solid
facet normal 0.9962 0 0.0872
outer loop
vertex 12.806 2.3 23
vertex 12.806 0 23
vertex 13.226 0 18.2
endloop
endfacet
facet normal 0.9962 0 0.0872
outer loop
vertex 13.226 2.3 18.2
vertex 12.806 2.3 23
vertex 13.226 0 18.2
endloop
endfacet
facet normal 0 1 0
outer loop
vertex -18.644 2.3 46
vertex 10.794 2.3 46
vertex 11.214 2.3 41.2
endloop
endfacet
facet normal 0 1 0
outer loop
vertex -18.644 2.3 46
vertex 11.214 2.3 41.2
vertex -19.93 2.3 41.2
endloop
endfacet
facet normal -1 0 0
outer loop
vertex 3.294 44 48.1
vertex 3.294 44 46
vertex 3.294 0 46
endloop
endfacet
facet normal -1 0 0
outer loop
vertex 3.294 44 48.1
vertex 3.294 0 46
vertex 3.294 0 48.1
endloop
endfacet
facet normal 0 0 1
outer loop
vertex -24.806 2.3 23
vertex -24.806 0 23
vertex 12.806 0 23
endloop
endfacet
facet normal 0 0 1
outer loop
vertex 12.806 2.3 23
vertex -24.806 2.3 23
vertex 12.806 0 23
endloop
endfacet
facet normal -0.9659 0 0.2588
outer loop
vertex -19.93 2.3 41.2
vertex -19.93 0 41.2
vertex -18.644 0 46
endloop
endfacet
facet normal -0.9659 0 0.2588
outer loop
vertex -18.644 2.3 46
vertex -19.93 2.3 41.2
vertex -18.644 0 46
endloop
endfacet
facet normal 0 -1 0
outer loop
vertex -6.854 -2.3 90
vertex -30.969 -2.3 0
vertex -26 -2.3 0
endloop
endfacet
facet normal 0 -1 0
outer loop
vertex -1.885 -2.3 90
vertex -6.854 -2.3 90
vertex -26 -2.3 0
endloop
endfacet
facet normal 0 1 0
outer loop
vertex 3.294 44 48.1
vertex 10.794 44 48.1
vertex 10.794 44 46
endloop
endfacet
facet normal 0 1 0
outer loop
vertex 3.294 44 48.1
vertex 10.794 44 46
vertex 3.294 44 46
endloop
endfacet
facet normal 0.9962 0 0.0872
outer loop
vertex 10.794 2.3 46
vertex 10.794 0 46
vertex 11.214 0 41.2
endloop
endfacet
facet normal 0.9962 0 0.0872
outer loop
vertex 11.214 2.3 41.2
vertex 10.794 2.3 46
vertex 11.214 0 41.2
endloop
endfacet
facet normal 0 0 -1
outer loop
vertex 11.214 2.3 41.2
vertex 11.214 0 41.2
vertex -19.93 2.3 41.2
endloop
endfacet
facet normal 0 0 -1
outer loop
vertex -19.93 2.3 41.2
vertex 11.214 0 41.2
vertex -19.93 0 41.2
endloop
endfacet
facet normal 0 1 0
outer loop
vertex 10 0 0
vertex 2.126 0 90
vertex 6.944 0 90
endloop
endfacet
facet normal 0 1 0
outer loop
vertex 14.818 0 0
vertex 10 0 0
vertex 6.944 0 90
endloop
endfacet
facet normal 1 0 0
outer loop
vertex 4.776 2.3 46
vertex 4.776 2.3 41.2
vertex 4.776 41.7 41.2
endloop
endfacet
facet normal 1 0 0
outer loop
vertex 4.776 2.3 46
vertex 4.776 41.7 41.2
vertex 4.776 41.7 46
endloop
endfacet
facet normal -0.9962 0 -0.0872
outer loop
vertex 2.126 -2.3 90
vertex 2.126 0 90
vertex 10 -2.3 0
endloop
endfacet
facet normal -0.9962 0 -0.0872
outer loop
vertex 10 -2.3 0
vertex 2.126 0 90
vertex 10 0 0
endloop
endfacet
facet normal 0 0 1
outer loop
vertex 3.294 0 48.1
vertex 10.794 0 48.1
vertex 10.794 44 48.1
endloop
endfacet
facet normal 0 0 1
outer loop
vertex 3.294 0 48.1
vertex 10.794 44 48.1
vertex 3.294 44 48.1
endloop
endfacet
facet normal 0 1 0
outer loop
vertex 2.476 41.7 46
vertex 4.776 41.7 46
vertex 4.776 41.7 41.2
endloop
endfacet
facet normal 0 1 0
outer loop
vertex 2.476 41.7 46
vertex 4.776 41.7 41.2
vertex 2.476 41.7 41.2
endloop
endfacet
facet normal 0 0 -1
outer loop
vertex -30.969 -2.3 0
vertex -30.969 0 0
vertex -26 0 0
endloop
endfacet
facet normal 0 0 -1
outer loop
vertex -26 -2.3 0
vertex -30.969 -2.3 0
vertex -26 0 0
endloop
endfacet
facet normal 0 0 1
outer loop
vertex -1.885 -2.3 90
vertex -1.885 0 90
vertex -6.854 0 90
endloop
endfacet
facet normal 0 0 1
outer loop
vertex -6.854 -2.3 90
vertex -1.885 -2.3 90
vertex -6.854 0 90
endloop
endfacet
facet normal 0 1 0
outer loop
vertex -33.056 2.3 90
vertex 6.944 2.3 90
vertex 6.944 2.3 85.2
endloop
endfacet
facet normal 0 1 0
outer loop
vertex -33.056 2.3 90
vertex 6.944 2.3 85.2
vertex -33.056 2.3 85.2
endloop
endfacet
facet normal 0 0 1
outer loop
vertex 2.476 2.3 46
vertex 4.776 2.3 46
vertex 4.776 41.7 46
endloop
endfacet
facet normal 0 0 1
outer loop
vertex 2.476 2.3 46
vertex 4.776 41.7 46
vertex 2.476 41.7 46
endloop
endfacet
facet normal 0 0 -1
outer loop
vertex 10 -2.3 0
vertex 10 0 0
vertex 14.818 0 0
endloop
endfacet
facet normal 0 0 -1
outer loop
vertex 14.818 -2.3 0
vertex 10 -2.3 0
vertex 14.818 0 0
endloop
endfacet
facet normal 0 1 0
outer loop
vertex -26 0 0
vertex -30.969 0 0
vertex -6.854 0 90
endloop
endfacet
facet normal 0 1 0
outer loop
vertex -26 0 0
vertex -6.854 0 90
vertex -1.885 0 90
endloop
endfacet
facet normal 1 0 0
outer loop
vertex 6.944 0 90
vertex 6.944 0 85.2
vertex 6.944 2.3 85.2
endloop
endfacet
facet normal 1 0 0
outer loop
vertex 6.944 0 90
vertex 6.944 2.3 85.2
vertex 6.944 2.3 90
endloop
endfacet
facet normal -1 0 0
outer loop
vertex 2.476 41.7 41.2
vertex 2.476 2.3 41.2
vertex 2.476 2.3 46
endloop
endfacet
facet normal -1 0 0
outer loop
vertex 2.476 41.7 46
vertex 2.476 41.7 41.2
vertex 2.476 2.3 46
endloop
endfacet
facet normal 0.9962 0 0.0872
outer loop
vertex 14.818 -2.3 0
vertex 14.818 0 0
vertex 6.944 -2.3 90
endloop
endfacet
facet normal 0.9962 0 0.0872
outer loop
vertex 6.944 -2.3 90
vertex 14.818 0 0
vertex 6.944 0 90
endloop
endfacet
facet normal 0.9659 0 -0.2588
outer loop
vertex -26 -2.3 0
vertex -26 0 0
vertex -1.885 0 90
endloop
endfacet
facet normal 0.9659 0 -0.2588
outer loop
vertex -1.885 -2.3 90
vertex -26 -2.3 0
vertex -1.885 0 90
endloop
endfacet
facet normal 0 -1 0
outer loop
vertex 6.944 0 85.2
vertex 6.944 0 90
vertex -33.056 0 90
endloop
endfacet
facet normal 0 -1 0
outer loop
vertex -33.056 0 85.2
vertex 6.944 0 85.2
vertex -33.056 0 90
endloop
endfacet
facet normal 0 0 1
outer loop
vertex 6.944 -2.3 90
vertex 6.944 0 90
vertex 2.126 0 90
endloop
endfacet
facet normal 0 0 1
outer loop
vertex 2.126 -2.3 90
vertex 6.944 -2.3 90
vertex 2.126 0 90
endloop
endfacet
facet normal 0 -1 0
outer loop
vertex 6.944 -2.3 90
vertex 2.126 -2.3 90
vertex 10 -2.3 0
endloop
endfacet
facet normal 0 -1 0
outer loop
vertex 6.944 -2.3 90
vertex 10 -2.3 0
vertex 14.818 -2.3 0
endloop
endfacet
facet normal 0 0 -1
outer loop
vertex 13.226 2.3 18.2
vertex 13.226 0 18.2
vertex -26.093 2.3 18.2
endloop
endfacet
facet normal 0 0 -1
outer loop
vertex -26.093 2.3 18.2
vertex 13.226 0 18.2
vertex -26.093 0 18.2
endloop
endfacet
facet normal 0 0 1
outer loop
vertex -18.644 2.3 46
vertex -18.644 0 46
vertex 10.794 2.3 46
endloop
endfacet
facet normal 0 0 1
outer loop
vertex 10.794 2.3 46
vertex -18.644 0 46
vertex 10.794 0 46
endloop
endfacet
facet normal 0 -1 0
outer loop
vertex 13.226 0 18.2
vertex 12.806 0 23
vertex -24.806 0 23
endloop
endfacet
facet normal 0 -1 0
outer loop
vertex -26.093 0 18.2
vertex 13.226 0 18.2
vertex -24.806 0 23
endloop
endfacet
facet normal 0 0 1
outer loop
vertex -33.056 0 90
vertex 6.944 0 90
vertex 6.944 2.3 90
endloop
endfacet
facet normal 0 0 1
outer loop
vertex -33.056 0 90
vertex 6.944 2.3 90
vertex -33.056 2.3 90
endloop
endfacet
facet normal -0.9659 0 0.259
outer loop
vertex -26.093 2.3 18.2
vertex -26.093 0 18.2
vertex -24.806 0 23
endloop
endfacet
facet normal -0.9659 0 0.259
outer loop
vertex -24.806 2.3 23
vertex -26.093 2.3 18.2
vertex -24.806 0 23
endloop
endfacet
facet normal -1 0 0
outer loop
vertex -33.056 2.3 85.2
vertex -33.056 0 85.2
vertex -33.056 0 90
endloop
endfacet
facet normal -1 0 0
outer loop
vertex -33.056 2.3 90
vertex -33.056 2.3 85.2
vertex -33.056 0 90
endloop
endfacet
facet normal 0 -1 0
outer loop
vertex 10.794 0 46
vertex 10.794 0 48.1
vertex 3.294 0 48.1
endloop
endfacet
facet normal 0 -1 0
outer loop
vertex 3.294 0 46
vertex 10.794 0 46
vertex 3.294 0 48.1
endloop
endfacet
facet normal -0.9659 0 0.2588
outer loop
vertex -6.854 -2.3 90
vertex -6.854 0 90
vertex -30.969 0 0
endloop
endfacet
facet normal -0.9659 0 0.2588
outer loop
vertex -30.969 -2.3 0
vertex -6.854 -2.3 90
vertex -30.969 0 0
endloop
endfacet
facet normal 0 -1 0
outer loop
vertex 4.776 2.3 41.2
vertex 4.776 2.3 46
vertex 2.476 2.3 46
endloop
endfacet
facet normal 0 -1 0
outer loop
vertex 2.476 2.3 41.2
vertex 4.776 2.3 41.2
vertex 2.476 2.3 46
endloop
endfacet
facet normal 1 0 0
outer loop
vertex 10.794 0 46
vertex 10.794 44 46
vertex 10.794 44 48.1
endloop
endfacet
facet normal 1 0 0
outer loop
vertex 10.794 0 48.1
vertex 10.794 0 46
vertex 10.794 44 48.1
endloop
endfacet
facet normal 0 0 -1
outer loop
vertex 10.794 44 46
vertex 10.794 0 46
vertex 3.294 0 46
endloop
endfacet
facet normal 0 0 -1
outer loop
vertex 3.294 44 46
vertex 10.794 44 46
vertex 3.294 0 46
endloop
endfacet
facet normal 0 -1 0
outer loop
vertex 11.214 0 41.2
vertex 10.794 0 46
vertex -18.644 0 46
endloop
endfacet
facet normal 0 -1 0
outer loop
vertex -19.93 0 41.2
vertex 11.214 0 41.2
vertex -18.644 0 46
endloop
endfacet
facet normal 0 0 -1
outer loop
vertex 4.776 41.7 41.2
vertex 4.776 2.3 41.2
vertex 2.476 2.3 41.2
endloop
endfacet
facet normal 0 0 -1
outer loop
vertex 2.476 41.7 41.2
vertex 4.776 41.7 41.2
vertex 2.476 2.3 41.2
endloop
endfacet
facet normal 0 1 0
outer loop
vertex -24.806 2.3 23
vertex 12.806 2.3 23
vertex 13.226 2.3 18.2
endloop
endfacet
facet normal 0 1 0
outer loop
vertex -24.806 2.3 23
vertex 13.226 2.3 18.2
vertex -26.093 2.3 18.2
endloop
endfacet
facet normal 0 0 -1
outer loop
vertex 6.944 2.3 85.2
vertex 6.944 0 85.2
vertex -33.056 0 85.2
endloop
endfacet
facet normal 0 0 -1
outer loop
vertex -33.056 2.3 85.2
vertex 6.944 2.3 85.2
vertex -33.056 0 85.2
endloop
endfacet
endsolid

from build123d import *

# Parameters (mm, degrees)
F1_DEPTH = 2.3
F2_W     = 40
F2_H     = 4.8
F3_DEPTH = 2.3
F4_W     = 7.5
F4_H     = 2.1
F5_DEPTH = 44
F6_W     = 2.3
F6_H     = 4.8
F7_DEPTH = 39.4


with BuildPart() as f1:
    # F0 (on Front) → F1 (new body)
    with BuildSketch(Plane.XZ):
        Polygon((2.12602, 90), (10, 0), (14.818335, 0), (6.944356, 90), align=None)
        Polygon((-30.969326, 0), (-26, 0), (-1.884573, 90), (-6.853898, 90), align=None)
    extrude(amount=F1_DEPTH)


with BuildPart() as f3:
    # F2 (on face) → F3 (new body)
    with BuildSketch(Plane(origin=(0, 0, 0), x_dir=(-1, 0, 0), z_dir=(0, 1, 0))):
        Polygon((-12.806096, 23), (-13.226042, 18.2), (26.09265, 18.2), (24.806494, 23), align=None)
        Polygon((-10.793857, 46), (-11.213802, 41.2), (19.929819, 41.2), (18.643663, 46), align=None)
        with Locations((13.055644, 87.6)):
            Rectangle(F2_W, F2_H)
    extrude(amount=F3_DEPTH)


with BuildPart() as f5:
    # F4 (on face) → F5 (new body)
    with BuildSketch(Plane(origin=(0, 0, 0), x_dir=(-1, 0, 0), z_dir=(0, 1, 0))):
        with Locations((-7.043857, 47.05)):
            Rectangle(F4_W, F4_H)
    extrude(amount=F5_DEPTH)


with BuildPart() as f7:
    # F6 (on face) → F7 (new body)
    with BuildSketch(Plane(origin=(0, 2.3, 0), x_dir=(-1, 0, 0), z_dir=(0, 1, 0))):
        with Locations((-3.62554, 43.6)):
            Rectangle(F6_W, F6_H)
    extrude(amount=F7_DEPTH)


solid = Compound([f1.part, f3.part, f5.part, f7.part])
